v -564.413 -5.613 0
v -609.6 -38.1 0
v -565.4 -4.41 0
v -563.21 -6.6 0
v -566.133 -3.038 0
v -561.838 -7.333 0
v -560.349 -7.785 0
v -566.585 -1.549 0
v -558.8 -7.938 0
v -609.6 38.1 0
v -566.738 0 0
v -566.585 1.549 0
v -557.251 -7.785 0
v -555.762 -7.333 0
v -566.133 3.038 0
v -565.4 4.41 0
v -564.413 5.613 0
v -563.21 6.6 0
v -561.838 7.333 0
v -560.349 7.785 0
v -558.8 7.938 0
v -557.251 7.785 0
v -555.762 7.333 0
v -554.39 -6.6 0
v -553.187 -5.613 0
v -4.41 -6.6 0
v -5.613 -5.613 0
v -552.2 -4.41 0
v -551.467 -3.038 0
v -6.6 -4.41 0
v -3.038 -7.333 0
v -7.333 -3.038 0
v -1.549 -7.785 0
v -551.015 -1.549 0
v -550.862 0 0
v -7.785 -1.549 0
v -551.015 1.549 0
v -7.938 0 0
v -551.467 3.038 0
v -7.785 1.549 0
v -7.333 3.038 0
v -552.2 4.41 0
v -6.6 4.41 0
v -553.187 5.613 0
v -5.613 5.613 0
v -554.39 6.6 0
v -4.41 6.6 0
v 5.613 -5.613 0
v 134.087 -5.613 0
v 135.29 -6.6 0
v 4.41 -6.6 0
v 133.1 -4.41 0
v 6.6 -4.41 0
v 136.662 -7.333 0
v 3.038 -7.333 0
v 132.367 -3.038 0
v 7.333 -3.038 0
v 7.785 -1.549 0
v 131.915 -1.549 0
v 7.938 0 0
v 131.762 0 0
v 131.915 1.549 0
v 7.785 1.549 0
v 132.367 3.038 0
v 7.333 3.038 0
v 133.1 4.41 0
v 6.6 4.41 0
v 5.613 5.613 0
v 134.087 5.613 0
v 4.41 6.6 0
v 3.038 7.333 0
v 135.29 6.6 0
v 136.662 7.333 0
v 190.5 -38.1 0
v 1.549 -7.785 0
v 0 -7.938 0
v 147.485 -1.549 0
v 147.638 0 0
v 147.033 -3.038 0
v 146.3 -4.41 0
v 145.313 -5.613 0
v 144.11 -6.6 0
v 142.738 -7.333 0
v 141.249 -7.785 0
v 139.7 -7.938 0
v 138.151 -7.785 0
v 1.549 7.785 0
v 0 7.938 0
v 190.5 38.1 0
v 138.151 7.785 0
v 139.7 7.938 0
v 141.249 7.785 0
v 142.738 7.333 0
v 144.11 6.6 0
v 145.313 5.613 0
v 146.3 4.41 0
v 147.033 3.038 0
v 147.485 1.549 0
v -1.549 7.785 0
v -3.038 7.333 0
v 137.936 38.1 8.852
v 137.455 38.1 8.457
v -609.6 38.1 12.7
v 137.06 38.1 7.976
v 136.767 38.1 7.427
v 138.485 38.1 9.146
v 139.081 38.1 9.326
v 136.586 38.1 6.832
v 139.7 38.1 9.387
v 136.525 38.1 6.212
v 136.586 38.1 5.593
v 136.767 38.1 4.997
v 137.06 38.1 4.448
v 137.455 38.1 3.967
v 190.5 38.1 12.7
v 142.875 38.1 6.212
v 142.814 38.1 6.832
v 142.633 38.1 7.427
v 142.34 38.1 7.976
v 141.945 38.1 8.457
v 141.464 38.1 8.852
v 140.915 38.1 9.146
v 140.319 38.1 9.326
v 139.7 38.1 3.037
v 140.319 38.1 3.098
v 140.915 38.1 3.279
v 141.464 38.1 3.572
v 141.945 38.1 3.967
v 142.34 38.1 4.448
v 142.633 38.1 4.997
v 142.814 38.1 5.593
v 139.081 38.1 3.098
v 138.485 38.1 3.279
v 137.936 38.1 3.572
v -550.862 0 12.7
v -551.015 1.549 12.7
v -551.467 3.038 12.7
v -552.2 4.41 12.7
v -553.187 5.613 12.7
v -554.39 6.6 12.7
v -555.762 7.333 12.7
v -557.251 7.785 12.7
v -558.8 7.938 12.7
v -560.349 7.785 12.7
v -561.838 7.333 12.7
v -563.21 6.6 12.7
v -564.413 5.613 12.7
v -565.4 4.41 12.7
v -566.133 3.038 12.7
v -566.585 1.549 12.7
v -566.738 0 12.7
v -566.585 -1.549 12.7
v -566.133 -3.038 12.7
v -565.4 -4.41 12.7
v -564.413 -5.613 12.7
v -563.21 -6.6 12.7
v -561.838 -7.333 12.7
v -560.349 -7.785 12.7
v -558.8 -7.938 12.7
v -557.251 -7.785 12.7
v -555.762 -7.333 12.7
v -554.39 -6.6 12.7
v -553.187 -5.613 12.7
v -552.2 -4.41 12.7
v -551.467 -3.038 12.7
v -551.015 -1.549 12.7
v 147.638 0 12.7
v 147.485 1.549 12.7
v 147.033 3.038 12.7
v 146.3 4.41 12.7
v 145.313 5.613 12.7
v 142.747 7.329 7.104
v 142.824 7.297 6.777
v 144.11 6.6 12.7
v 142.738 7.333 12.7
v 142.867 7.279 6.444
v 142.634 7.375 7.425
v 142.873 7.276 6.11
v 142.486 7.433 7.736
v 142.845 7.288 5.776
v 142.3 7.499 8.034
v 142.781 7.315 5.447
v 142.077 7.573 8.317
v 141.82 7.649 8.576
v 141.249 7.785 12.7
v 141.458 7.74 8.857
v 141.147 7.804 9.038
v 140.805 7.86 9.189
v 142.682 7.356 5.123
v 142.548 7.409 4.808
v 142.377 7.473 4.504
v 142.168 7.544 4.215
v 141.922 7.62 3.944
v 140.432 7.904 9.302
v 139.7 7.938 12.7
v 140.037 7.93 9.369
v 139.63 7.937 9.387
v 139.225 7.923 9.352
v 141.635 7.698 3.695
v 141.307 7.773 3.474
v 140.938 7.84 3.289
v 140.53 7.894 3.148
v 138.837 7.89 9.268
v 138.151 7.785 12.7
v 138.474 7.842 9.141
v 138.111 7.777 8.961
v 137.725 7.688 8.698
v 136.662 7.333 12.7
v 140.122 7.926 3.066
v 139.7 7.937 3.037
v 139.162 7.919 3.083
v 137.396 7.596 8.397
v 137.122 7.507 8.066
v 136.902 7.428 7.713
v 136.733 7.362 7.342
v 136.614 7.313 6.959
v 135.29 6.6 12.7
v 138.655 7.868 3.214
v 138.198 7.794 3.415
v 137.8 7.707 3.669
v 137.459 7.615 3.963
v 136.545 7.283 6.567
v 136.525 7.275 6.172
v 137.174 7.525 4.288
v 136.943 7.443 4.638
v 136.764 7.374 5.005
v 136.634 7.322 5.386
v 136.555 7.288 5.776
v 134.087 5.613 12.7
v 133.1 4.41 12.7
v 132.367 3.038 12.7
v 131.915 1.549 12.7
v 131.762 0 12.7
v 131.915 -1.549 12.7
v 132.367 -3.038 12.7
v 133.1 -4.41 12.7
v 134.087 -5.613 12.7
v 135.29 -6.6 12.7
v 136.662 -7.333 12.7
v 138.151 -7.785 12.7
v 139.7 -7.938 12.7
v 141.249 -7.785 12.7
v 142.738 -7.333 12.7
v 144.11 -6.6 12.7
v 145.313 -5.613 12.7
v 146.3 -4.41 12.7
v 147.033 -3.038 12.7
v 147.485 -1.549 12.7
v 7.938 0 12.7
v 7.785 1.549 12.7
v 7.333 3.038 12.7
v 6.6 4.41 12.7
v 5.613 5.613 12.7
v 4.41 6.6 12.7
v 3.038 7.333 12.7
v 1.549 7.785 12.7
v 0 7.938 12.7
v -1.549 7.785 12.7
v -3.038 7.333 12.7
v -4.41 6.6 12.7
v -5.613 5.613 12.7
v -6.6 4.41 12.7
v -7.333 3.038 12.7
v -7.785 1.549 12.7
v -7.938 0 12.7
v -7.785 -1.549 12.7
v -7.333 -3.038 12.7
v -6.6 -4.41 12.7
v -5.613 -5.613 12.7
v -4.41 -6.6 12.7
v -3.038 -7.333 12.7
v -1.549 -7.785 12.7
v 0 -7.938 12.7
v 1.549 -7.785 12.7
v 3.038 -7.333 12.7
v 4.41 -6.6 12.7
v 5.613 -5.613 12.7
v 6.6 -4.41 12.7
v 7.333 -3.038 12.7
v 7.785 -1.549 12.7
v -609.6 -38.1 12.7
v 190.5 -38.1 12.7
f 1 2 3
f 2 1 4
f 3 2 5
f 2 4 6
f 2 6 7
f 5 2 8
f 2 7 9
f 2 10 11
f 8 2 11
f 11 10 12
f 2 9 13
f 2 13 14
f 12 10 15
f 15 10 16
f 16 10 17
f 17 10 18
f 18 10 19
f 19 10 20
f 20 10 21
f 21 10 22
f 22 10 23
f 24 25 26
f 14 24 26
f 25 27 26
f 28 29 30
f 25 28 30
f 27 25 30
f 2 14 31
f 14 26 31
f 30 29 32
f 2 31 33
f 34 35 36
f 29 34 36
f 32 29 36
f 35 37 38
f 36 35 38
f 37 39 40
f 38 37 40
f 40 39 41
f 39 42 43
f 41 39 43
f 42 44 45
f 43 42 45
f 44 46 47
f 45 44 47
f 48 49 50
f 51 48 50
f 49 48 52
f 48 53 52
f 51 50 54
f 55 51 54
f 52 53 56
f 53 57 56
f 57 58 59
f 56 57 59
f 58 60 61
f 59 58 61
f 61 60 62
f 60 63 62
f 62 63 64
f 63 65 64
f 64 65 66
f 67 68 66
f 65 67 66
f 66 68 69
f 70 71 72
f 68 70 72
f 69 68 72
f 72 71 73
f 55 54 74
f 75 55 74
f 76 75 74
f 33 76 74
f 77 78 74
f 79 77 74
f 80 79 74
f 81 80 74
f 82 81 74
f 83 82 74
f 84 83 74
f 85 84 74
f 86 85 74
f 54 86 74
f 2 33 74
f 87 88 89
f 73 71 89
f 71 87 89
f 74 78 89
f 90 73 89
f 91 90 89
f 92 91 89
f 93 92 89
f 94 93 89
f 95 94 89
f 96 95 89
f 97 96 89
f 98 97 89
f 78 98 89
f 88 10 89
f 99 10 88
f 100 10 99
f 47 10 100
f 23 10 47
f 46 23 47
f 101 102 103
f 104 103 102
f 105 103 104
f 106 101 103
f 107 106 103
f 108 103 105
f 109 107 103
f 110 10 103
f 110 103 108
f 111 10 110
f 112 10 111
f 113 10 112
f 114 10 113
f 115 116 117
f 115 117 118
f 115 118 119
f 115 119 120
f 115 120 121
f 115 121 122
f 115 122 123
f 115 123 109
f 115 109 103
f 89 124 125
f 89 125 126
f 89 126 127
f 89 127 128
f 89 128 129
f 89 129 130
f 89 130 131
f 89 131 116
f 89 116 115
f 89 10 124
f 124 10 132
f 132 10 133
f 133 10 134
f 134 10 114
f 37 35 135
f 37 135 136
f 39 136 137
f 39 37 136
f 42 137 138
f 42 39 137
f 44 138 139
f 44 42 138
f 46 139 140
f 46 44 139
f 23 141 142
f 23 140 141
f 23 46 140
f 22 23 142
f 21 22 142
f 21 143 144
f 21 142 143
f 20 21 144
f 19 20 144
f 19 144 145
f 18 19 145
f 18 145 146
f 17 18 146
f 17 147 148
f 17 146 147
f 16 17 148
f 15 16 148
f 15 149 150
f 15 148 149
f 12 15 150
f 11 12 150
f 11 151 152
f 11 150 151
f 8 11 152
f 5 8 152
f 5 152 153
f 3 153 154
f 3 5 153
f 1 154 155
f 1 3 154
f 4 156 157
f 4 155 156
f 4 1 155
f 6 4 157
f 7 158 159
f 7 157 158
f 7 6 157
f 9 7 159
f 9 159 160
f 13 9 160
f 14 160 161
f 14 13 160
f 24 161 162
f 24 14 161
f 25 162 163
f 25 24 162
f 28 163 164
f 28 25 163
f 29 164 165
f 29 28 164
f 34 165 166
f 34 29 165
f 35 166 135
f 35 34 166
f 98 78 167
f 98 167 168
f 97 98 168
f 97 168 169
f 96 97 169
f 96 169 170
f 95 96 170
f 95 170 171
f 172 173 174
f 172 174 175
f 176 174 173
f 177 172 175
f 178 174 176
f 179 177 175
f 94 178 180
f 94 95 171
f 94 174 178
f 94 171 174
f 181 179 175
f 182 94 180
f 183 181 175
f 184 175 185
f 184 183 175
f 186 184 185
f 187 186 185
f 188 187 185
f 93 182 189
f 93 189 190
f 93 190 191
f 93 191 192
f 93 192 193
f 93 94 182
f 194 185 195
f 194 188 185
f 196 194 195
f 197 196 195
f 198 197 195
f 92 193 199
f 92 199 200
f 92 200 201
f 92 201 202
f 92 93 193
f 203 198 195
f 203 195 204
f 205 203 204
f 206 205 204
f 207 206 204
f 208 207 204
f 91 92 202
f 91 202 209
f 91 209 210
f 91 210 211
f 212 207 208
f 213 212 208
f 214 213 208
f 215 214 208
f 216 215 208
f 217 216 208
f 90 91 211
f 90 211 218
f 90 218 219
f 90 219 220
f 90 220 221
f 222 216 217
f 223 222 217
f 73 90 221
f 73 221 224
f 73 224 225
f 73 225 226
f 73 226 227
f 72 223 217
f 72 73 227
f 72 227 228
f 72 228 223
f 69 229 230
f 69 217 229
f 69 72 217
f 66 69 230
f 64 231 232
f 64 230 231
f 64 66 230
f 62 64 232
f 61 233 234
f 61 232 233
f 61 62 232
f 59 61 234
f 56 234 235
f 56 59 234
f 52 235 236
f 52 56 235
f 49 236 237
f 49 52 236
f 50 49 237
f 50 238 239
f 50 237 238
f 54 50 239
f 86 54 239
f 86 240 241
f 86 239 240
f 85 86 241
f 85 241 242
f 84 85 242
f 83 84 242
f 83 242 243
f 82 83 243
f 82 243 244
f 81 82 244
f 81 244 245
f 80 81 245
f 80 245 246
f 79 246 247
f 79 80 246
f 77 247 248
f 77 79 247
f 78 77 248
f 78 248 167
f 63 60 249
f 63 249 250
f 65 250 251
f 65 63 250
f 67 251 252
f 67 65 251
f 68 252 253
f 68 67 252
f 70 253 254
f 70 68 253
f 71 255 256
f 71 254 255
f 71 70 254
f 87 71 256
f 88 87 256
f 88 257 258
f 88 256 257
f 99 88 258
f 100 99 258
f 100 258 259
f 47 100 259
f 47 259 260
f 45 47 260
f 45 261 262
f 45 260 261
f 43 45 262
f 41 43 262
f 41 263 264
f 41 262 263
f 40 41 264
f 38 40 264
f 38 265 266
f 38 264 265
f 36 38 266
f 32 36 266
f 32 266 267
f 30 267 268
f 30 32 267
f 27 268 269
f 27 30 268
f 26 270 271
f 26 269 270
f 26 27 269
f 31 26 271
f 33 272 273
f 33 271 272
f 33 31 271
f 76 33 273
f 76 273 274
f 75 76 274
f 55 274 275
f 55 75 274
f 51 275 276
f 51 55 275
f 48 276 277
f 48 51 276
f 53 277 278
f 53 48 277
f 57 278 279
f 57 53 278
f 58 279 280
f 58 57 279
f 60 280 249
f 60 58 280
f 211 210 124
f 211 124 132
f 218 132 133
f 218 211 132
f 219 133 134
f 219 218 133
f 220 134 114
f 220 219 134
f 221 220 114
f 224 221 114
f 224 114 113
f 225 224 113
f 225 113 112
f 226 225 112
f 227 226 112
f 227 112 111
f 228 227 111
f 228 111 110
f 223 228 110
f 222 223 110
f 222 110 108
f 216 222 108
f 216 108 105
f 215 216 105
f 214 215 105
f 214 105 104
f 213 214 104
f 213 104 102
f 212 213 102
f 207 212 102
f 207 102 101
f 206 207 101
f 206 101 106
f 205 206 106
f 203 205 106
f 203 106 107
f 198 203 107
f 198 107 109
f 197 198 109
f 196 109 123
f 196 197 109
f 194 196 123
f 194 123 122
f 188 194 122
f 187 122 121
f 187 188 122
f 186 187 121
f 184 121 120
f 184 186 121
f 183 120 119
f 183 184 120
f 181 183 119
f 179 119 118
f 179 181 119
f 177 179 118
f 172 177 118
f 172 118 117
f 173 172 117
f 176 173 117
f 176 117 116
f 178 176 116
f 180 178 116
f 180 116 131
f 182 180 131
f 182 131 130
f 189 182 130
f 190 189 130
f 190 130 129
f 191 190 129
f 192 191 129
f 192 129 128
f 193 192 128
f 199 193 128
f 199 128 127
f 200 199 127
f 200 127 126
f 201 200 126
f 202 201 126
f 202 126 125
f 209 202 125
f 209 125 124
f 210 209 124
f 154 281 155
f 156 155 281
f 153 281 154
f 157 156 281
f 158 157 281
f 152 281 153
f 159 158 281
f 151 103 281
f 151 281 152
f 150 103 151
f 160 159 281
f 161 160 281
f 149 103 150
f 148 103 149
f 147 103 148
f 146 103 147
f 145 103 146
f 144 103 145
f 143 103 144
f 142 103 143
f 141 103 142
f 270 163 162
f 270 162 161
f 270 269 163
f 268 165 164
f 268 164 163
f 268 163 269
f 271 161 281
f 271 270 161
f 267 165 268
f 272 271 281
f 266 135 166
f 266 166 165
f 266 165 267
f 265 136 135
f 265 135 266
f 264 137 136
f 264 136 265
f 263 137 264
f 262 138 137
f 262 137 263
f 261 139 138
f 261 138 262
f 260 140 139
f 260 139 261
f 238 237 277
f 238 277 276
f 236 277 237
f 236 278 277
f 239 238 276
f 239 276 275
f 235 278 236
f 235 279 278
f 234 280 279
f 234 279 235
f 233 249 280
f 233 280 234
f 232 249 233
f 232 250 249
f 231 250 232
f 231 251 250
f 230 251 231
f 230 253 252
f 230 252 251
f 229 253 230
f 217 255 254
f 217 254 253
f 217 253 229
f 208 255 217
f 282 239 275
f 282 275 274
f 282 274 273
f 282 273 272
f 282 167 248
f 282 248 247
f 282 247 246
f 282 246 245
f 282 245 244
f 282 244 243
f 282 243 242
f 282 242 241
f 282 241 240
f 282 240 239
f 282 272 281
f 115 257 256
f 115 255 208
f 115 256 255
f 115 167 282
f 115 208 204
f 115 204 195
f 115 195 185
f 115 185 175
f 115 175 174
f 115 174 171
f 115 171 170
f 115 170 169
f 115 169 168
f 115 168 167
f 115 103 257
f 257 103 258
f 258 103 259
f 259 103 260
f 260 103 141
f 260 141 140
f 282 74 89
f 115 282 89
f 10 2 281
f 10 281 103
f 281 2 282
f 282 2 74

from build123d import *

# Parameters (mm, degrees)
SKETCH1_W               = 800.1
SKETCH1_H               = 76.2
BOSS_EXTRUDE1_DEPTH     = 12.7
CUT_EXTRUDE1_DEPTH      = 611.921484317
CUT_EXTRUDE1_DEPTH_BACK = 611.921484317
SKETCH2_R               = 7.9375
CUT_EXTRUDE2_DEPTH      = 615.475296493
CUT_EXTRUDE2_DEPTH_BACK = 31.75
SKETCH3_R               = 3.175


with BuildPart() as part:
    # Sketch1 → Boss-Extrude1 (new body)
    with BuildSketch(Plane.XY):
        with Locations((-209.55, 0)):
            Rectangle(SKETCH1_W, SKETCH1_H)
    extrude(amount=BOSS_EXTRUDE1_DEPTH)

    # Sketch2 → Cut-Extrude1 (cut, two sides: drawn at the far end of the back side and taken through both)
    with BuildSketch(Plane.XY.offset(12.7).offset(-CUT_EXTRUDE1_DEPTH_BACK)):
        Circle(SKETCH2_R)
        with Locations((-558.8, 0)):
            Circle(SKETCH2_R)
        with Locations((139.7, 0)):
            Circle(SKETCH2_R)
    extrude(amount=CUT_EXTRUDE1_DEPTH + CUT_EXTRUDE1_DEPTH_BACK, mode=Mode.SUBTRACT)

    # Sketch3 → Cut-Extrude2 (cut, two sides: drawn at the far end of the back side and taken through both)
    with BuildSketch(Plane(origin=(0, 38.1, 0), x_dir=(1, 0, 0), z_dir=(0, 1, 0)).offset(-CUT_EXTRUDE2_DEPTH_BACK)):
        with Locations(Location((139.7, -6.212362636, 0), (0, 0, 90))):
            Circle(SKETCH3_R)
    extrude(amount=CUT_EXTRUDE2_DEPTH + CUT_EXTRUDE2_DEPTH_BACK, mode=Mode.SUBTRACT)


solid = part.part
